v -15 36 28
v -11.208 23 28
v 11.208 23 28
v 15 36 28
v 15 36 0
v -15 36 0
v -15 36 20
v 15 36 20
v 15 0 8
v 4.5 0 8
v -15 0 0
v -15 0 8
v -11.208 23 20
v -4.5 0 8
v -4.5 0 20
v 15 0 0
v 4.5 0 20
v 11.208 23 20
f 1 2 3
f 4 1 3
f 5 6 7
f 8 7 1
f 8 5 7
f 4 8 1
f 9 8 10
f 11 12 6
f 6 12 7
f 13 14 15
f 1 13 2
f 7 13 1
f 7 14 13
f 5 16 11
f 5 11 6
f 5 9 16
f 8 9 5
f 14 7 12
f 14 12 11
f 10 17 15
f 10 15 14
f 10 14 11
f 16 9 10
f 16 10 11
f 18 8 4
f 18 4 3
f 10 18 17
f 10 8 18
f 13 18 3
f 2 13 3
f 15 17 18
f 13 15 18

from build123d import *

# Parameters (mm, degrees)
F1_DEPTH = 15
F3_DEPTH = 28
F0_W     = 23
F0_H     = 10
F4_DEPTH = 15


with BuildPart() as f1:
    # F0 (on Right) → F1 (new body, symmetric)
    with BuildSketch(Plane.YZ):
        Polygon((0, 8), (0, 0), (36, 0), (36, 20), align=None)
    extrude(amount=F1_DEPTH, both=True)

    # F2 (on face) → F3 (join)
    with BuildSketch(Plane(origin=(0, 0, 0), x_dir=(1, 0, 0), z_dir=(0, 0, -1))):
        Polygon((4.5, 0), (-4.5, 0), (-15, -36), (15, -36), align=None)
    extrude(amount=-F3_DEPTH)

    # F0 (on Right) → F4 (cut, symmetric)
    with BuildSketch(Plane.YZ):
        with Locations((11.5, 25)):
            Rectangle(F0_W, F0_H)
    extrude(amount=F4_DEPTH, both=True, mode=Mode.SUBTRACT)


solid = f1.part
